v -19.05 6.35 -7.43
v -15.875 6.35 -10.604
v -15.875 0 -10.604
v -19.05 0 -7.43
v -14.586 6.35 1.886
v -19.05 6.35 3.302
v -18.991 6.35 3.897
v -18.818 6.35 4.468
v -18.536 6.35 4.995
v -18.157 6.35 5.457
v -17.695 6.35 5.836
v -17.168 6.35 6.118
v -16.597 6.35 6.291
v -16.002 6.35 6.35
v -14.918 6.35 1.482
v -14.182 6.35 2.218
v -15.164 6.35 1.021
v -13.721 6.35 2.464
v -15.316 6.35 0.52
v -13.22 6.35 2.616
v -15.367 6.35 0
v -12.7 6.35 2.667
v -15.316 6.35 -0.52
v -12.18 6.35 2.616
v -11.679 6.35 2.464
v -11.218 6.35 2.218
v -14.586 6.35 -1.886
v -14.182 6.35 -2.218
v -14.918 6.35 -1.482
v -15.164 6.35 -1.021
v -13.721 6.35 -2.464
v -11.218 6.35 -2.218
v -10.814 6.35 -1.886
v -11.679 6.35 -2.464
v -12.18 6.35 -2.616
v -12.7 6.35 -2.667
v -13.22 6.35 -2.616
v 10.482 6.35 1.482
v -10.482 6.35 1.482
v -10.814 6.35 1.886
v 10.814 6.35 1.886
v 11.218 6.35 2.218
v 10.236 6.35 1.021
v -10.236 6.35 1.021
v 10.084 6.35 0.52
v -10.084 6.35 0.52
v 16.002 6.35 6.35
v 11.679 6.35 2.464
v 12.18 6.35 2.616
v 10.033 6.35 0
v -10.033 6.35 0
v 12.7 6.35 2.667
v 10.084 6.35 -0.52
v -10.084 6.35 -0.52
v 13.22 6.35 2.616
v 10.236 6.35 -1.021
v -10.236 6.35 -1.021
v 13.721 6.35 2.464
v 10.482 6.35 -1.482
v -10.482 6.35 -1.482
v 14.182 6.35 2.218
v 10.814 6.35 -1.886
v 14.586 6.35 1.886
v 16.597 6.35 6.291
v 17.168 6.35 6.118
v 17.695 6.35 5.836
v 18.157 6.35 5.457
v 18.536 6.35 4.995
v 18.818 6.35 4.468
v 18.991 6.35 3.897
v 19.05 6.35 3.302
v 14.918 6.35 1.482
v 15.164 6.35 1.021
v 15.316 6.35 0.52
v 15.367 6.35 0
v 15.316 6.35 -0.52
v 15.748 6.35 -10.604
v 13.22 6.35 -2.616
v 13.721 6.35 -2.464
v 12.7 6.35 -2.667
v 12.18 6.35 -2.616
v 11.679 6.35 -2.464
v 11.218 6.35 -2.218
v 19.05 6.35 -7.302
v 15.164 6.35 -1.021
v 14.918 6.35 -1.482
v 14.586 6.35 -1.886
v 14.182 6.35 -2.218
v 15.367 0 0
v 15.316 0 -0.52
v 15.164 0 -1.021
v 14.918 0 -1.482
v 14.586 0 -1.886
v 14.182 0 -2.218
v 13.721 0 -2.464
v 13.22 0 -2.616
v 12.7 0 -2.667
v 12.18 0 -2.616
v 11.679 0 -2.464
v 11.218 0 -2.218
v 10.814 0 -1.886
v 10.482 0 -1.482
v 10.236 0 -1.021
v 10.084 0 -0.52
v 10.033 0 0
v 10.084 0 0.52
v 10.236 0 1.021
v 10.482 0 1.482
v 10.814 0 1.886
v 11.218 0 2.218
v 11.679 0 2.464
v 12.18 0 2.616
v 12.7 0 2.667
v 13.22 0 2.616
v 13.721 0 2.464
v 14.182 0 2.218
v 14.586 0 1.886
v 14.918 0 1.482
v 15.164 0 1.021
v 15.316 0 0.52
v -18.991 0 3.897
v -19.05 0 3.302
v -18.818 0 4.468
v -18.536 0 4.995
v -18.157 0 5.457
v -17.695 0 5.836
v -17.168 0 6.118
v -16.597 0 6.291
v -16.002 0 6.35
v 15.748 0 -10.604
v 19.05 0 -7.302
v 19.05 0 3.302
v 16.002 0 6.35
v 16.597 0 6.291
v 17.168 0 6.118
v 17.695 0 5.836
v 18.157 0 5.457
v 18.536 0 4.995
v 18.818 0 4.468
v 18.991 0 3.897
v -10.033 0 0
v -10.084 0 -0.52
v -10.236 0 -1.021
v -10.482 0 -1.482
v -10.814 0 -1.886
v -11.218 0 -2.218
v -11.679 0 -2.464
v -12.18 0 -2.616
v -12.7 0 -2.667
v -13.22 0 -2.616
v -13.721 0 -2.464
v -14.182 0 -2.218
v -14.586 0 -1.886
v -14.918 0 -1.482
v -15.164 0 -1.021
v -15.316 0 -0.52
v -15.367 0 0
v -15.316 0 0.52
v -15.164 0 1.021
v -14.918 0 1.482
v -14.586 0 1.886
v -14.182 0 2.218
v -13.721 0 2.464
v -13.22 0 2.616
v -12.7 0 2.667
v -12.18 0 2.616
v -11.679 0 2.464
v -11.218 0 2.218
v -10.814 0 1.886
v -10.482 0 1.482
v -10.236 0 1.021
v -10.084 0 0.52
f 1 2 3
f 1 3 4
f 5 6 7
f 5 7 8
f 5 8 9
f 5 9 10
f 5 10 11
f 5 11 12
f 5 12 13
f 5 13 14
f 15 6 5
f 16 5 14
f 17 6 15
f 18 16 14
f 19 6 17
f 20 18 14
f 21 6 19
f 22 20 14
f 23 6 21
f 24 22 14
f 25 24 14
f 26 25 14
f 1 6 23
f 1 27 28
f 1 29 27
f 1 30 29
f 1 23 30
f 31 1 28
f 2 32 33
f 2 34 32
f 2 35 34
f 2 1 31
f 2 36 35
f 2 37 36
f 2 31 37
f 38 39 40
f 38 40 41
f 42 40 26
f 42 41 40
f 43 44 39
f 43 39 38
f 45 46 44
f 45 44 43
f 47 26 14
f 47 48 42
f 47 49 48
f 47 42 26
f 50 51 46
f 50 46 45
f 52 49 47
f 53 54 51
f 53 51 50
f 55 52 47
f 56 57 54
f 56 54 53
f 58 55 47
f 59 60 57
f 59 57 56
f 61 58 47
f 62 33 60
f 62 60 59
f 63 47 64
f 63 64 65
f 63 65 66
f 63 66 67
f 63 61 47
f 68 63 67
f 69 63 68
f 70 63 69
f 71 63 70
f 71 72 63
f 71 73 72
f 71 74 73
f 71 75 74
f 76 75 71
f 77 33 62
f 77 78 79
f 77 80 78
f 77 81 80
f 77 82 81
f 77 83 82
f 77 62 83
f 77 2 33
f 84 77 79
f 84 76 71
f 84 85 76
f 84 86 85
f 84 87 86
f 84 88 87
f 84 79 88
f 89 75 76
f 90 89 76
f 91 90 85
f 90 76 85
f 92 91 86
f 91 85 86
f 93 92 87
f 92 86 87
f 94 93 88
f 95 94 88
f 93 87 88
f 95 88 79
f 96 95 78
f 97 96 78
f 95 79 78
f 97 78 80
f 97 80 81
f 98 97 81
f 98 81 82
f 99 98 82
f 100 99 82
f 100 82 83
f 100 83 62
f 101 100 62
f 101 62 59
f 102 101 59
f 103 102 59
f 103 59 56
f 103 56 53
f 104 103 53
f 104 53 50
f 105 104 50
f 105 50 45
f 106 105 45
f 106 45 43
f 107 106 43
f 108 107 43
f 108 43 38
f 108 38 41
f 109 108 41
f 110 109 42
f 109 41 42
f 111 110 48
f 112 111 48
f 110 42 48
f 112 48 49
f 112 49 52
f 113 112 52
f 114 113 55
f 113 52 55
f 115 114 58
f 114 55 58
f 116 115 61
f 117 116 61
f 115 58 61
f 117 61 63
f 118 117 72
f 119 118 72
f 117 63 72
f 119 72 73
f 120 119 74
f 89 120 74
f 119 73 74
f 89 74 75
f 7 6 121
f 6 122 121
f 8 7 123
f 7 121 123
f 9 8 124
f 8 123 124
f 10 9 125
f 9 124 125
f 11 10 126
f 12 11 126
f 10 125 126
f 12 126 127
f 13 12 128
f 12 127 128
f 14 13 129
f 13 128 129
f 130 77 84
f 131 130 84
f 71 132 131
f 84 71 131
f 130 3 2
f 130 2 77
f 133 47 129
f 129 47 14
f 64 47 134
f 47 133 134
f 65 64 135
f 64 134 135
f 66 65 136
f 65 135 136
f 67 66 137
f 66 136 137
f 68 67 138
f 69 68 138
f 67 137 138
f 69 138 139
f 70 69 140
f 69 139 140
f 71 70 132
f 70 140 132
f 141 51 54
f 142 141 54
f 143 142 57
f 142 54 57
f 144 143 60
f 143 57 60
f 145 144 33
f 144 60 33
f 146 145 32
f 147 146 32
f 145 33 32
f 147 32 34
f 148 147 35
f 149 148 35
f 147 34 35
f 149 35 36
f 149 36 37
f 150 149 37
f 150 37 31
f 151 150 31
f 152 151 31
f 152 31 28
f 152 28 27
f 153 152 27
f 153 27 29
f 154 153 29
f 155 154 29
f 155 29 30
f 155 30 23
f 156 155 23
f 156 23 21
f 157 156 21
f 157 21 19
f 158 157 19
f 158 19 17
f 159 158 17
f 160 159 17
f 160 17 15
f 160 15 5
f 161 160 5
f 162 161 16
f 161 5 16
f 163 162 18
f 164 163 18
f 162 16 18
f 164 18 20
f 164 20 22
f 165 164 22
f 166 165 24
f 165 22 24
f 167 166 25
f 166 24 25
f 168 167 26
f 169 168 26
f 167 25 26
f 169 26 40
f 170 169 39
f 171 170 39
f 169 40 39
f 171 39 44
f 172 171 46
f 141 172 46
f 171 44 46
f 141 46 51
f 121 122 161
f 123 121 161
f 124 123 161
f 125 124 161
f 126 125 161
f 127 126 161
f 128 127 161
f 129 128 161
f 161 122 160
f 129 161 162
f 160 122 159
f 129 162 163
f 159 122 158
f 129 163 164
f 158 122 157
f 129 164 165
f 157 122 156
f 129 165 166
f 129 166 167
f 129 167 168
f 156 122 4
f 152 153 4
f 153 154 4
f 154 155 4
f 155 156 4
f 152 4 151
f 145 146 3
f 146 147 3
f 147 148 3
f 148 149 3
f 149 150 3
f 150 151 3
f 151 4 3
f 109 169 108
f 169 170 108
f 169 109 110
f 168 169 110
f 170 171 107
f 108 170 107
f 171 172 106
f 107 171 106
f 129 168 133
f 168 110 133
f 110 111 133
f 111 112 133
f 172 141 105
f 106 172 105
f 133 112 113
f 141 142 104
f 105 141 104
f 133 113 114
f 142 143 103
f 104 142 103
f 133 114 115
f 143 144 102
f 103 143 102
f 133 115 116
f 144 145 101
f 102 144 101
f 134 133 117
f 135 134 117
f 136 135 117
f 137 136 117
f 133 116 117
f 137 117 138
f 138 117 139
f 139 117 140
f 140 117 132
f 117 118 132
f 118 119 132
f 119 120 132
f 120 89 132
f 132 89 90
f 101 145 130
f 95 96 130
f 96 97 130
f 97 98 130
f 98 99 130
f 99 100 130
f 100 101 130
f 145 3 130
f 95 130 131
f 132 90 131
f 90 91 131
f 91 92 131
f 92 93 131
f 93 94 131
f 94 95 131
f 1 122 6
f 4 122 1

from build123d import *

# Parameters (mm, degrees)
SKETCH1_W           = 38.1
SKETCH1_H           = 21.209
BOSS_EXTRUDE1_DEPTH = 6.35
SKETCH2_R           = 2.667
CUT_EXTRUDE1_DEPTH  = 9.525
CUT_EXTRUDE2_DEPTH  = 9.525
CUT_EXTRUDE4_DEPTH  = 9.525
FILLET2_R           = 3.048


with BuildPart() as part:
    # Sketch1 → Boss-Extrude1 (new body)
    with BuildSketch(Plane(origin=(0, 0, 0), x_dir=(1, 0, 0), z_dir=(0, 1, 0))):
        Rectangle(SKETCH1_W, SKETCH1_H)
    extrude(amount=BOSS_EXTRUDE1_DEPTH)

    # Sketch2 → Cut-Extrude1 (cut)
    with BuildSketch(Plane(origin=(0, 6.35, 0), x_dir=(1, 0, 0), z_dir=(0, 1, 0))):
        with Locations((-12.7, 0)):
            Circle(SKETCH2_R)
        with Locations((12.7, 0)):
            Circle(SKETCH2_R)
    extrude(amount=-CUT_EXTRUDE1_DEPTH, mode=Mode.SUBTRACT)

    # Sketch3 → Cut-Extrude2 (cut)
    with BuildSketch(Plane(origin=(0, 6.35, 0), x_dir=(1, 0, 0), z_dir=(0, 1, 0))):
        Polygon((-19.05, 10.6045), (-15.875, 10.6045), (-19.05, 7.4295), align=None)
        Polygon((19.05, 10.6045), (15.748, 10.6045), (19.05, 7.3025), align=None)
        Polygon((19.05, -10.6045), (15.748, -10.6045), (19.05, -7.3025), align=None)
        Polygon((-19.05, -10.6045), (-15.875, -10.6045), (-19.05, -7.4295), align=None)
    extrude(amount=-CUT_EXTRUDE2_DEPTH, mode=Mode.SUBTRACT)

    # Sketch4 → Cut-Extrude4 (cut)
    with BuildSketch(Plane(origin=(0, 6.35, 0), x_dir=(1, 0, 0), z_dir=(0, 1, 0))):
        Polygon((-19.05, -7.4295), (-15.875, -10.6045), (-15.875, -6.35), (-19.05, -6.35), align=None)
        Polygon((15.748, -10.6045), (19.05, -7.3025), (19.05, -6.35), (-15.875, -6.35), (-15.875, -10.6045), align=None)
    extrude(amount=-CUT_EXTRUDE4_DEPTH, mode=Mode.SUBTRACT)

    # Fillet2
    fillet2_edges = [part.edges().sort_by_distance(p)[0] for p in [
        (-19.05, 3.175, 6.35),
        (19.05, 3.175, 6.35),
    ]]
    fillet(fillet2_edges, radius=FILLET2_R)


solid = part.part
